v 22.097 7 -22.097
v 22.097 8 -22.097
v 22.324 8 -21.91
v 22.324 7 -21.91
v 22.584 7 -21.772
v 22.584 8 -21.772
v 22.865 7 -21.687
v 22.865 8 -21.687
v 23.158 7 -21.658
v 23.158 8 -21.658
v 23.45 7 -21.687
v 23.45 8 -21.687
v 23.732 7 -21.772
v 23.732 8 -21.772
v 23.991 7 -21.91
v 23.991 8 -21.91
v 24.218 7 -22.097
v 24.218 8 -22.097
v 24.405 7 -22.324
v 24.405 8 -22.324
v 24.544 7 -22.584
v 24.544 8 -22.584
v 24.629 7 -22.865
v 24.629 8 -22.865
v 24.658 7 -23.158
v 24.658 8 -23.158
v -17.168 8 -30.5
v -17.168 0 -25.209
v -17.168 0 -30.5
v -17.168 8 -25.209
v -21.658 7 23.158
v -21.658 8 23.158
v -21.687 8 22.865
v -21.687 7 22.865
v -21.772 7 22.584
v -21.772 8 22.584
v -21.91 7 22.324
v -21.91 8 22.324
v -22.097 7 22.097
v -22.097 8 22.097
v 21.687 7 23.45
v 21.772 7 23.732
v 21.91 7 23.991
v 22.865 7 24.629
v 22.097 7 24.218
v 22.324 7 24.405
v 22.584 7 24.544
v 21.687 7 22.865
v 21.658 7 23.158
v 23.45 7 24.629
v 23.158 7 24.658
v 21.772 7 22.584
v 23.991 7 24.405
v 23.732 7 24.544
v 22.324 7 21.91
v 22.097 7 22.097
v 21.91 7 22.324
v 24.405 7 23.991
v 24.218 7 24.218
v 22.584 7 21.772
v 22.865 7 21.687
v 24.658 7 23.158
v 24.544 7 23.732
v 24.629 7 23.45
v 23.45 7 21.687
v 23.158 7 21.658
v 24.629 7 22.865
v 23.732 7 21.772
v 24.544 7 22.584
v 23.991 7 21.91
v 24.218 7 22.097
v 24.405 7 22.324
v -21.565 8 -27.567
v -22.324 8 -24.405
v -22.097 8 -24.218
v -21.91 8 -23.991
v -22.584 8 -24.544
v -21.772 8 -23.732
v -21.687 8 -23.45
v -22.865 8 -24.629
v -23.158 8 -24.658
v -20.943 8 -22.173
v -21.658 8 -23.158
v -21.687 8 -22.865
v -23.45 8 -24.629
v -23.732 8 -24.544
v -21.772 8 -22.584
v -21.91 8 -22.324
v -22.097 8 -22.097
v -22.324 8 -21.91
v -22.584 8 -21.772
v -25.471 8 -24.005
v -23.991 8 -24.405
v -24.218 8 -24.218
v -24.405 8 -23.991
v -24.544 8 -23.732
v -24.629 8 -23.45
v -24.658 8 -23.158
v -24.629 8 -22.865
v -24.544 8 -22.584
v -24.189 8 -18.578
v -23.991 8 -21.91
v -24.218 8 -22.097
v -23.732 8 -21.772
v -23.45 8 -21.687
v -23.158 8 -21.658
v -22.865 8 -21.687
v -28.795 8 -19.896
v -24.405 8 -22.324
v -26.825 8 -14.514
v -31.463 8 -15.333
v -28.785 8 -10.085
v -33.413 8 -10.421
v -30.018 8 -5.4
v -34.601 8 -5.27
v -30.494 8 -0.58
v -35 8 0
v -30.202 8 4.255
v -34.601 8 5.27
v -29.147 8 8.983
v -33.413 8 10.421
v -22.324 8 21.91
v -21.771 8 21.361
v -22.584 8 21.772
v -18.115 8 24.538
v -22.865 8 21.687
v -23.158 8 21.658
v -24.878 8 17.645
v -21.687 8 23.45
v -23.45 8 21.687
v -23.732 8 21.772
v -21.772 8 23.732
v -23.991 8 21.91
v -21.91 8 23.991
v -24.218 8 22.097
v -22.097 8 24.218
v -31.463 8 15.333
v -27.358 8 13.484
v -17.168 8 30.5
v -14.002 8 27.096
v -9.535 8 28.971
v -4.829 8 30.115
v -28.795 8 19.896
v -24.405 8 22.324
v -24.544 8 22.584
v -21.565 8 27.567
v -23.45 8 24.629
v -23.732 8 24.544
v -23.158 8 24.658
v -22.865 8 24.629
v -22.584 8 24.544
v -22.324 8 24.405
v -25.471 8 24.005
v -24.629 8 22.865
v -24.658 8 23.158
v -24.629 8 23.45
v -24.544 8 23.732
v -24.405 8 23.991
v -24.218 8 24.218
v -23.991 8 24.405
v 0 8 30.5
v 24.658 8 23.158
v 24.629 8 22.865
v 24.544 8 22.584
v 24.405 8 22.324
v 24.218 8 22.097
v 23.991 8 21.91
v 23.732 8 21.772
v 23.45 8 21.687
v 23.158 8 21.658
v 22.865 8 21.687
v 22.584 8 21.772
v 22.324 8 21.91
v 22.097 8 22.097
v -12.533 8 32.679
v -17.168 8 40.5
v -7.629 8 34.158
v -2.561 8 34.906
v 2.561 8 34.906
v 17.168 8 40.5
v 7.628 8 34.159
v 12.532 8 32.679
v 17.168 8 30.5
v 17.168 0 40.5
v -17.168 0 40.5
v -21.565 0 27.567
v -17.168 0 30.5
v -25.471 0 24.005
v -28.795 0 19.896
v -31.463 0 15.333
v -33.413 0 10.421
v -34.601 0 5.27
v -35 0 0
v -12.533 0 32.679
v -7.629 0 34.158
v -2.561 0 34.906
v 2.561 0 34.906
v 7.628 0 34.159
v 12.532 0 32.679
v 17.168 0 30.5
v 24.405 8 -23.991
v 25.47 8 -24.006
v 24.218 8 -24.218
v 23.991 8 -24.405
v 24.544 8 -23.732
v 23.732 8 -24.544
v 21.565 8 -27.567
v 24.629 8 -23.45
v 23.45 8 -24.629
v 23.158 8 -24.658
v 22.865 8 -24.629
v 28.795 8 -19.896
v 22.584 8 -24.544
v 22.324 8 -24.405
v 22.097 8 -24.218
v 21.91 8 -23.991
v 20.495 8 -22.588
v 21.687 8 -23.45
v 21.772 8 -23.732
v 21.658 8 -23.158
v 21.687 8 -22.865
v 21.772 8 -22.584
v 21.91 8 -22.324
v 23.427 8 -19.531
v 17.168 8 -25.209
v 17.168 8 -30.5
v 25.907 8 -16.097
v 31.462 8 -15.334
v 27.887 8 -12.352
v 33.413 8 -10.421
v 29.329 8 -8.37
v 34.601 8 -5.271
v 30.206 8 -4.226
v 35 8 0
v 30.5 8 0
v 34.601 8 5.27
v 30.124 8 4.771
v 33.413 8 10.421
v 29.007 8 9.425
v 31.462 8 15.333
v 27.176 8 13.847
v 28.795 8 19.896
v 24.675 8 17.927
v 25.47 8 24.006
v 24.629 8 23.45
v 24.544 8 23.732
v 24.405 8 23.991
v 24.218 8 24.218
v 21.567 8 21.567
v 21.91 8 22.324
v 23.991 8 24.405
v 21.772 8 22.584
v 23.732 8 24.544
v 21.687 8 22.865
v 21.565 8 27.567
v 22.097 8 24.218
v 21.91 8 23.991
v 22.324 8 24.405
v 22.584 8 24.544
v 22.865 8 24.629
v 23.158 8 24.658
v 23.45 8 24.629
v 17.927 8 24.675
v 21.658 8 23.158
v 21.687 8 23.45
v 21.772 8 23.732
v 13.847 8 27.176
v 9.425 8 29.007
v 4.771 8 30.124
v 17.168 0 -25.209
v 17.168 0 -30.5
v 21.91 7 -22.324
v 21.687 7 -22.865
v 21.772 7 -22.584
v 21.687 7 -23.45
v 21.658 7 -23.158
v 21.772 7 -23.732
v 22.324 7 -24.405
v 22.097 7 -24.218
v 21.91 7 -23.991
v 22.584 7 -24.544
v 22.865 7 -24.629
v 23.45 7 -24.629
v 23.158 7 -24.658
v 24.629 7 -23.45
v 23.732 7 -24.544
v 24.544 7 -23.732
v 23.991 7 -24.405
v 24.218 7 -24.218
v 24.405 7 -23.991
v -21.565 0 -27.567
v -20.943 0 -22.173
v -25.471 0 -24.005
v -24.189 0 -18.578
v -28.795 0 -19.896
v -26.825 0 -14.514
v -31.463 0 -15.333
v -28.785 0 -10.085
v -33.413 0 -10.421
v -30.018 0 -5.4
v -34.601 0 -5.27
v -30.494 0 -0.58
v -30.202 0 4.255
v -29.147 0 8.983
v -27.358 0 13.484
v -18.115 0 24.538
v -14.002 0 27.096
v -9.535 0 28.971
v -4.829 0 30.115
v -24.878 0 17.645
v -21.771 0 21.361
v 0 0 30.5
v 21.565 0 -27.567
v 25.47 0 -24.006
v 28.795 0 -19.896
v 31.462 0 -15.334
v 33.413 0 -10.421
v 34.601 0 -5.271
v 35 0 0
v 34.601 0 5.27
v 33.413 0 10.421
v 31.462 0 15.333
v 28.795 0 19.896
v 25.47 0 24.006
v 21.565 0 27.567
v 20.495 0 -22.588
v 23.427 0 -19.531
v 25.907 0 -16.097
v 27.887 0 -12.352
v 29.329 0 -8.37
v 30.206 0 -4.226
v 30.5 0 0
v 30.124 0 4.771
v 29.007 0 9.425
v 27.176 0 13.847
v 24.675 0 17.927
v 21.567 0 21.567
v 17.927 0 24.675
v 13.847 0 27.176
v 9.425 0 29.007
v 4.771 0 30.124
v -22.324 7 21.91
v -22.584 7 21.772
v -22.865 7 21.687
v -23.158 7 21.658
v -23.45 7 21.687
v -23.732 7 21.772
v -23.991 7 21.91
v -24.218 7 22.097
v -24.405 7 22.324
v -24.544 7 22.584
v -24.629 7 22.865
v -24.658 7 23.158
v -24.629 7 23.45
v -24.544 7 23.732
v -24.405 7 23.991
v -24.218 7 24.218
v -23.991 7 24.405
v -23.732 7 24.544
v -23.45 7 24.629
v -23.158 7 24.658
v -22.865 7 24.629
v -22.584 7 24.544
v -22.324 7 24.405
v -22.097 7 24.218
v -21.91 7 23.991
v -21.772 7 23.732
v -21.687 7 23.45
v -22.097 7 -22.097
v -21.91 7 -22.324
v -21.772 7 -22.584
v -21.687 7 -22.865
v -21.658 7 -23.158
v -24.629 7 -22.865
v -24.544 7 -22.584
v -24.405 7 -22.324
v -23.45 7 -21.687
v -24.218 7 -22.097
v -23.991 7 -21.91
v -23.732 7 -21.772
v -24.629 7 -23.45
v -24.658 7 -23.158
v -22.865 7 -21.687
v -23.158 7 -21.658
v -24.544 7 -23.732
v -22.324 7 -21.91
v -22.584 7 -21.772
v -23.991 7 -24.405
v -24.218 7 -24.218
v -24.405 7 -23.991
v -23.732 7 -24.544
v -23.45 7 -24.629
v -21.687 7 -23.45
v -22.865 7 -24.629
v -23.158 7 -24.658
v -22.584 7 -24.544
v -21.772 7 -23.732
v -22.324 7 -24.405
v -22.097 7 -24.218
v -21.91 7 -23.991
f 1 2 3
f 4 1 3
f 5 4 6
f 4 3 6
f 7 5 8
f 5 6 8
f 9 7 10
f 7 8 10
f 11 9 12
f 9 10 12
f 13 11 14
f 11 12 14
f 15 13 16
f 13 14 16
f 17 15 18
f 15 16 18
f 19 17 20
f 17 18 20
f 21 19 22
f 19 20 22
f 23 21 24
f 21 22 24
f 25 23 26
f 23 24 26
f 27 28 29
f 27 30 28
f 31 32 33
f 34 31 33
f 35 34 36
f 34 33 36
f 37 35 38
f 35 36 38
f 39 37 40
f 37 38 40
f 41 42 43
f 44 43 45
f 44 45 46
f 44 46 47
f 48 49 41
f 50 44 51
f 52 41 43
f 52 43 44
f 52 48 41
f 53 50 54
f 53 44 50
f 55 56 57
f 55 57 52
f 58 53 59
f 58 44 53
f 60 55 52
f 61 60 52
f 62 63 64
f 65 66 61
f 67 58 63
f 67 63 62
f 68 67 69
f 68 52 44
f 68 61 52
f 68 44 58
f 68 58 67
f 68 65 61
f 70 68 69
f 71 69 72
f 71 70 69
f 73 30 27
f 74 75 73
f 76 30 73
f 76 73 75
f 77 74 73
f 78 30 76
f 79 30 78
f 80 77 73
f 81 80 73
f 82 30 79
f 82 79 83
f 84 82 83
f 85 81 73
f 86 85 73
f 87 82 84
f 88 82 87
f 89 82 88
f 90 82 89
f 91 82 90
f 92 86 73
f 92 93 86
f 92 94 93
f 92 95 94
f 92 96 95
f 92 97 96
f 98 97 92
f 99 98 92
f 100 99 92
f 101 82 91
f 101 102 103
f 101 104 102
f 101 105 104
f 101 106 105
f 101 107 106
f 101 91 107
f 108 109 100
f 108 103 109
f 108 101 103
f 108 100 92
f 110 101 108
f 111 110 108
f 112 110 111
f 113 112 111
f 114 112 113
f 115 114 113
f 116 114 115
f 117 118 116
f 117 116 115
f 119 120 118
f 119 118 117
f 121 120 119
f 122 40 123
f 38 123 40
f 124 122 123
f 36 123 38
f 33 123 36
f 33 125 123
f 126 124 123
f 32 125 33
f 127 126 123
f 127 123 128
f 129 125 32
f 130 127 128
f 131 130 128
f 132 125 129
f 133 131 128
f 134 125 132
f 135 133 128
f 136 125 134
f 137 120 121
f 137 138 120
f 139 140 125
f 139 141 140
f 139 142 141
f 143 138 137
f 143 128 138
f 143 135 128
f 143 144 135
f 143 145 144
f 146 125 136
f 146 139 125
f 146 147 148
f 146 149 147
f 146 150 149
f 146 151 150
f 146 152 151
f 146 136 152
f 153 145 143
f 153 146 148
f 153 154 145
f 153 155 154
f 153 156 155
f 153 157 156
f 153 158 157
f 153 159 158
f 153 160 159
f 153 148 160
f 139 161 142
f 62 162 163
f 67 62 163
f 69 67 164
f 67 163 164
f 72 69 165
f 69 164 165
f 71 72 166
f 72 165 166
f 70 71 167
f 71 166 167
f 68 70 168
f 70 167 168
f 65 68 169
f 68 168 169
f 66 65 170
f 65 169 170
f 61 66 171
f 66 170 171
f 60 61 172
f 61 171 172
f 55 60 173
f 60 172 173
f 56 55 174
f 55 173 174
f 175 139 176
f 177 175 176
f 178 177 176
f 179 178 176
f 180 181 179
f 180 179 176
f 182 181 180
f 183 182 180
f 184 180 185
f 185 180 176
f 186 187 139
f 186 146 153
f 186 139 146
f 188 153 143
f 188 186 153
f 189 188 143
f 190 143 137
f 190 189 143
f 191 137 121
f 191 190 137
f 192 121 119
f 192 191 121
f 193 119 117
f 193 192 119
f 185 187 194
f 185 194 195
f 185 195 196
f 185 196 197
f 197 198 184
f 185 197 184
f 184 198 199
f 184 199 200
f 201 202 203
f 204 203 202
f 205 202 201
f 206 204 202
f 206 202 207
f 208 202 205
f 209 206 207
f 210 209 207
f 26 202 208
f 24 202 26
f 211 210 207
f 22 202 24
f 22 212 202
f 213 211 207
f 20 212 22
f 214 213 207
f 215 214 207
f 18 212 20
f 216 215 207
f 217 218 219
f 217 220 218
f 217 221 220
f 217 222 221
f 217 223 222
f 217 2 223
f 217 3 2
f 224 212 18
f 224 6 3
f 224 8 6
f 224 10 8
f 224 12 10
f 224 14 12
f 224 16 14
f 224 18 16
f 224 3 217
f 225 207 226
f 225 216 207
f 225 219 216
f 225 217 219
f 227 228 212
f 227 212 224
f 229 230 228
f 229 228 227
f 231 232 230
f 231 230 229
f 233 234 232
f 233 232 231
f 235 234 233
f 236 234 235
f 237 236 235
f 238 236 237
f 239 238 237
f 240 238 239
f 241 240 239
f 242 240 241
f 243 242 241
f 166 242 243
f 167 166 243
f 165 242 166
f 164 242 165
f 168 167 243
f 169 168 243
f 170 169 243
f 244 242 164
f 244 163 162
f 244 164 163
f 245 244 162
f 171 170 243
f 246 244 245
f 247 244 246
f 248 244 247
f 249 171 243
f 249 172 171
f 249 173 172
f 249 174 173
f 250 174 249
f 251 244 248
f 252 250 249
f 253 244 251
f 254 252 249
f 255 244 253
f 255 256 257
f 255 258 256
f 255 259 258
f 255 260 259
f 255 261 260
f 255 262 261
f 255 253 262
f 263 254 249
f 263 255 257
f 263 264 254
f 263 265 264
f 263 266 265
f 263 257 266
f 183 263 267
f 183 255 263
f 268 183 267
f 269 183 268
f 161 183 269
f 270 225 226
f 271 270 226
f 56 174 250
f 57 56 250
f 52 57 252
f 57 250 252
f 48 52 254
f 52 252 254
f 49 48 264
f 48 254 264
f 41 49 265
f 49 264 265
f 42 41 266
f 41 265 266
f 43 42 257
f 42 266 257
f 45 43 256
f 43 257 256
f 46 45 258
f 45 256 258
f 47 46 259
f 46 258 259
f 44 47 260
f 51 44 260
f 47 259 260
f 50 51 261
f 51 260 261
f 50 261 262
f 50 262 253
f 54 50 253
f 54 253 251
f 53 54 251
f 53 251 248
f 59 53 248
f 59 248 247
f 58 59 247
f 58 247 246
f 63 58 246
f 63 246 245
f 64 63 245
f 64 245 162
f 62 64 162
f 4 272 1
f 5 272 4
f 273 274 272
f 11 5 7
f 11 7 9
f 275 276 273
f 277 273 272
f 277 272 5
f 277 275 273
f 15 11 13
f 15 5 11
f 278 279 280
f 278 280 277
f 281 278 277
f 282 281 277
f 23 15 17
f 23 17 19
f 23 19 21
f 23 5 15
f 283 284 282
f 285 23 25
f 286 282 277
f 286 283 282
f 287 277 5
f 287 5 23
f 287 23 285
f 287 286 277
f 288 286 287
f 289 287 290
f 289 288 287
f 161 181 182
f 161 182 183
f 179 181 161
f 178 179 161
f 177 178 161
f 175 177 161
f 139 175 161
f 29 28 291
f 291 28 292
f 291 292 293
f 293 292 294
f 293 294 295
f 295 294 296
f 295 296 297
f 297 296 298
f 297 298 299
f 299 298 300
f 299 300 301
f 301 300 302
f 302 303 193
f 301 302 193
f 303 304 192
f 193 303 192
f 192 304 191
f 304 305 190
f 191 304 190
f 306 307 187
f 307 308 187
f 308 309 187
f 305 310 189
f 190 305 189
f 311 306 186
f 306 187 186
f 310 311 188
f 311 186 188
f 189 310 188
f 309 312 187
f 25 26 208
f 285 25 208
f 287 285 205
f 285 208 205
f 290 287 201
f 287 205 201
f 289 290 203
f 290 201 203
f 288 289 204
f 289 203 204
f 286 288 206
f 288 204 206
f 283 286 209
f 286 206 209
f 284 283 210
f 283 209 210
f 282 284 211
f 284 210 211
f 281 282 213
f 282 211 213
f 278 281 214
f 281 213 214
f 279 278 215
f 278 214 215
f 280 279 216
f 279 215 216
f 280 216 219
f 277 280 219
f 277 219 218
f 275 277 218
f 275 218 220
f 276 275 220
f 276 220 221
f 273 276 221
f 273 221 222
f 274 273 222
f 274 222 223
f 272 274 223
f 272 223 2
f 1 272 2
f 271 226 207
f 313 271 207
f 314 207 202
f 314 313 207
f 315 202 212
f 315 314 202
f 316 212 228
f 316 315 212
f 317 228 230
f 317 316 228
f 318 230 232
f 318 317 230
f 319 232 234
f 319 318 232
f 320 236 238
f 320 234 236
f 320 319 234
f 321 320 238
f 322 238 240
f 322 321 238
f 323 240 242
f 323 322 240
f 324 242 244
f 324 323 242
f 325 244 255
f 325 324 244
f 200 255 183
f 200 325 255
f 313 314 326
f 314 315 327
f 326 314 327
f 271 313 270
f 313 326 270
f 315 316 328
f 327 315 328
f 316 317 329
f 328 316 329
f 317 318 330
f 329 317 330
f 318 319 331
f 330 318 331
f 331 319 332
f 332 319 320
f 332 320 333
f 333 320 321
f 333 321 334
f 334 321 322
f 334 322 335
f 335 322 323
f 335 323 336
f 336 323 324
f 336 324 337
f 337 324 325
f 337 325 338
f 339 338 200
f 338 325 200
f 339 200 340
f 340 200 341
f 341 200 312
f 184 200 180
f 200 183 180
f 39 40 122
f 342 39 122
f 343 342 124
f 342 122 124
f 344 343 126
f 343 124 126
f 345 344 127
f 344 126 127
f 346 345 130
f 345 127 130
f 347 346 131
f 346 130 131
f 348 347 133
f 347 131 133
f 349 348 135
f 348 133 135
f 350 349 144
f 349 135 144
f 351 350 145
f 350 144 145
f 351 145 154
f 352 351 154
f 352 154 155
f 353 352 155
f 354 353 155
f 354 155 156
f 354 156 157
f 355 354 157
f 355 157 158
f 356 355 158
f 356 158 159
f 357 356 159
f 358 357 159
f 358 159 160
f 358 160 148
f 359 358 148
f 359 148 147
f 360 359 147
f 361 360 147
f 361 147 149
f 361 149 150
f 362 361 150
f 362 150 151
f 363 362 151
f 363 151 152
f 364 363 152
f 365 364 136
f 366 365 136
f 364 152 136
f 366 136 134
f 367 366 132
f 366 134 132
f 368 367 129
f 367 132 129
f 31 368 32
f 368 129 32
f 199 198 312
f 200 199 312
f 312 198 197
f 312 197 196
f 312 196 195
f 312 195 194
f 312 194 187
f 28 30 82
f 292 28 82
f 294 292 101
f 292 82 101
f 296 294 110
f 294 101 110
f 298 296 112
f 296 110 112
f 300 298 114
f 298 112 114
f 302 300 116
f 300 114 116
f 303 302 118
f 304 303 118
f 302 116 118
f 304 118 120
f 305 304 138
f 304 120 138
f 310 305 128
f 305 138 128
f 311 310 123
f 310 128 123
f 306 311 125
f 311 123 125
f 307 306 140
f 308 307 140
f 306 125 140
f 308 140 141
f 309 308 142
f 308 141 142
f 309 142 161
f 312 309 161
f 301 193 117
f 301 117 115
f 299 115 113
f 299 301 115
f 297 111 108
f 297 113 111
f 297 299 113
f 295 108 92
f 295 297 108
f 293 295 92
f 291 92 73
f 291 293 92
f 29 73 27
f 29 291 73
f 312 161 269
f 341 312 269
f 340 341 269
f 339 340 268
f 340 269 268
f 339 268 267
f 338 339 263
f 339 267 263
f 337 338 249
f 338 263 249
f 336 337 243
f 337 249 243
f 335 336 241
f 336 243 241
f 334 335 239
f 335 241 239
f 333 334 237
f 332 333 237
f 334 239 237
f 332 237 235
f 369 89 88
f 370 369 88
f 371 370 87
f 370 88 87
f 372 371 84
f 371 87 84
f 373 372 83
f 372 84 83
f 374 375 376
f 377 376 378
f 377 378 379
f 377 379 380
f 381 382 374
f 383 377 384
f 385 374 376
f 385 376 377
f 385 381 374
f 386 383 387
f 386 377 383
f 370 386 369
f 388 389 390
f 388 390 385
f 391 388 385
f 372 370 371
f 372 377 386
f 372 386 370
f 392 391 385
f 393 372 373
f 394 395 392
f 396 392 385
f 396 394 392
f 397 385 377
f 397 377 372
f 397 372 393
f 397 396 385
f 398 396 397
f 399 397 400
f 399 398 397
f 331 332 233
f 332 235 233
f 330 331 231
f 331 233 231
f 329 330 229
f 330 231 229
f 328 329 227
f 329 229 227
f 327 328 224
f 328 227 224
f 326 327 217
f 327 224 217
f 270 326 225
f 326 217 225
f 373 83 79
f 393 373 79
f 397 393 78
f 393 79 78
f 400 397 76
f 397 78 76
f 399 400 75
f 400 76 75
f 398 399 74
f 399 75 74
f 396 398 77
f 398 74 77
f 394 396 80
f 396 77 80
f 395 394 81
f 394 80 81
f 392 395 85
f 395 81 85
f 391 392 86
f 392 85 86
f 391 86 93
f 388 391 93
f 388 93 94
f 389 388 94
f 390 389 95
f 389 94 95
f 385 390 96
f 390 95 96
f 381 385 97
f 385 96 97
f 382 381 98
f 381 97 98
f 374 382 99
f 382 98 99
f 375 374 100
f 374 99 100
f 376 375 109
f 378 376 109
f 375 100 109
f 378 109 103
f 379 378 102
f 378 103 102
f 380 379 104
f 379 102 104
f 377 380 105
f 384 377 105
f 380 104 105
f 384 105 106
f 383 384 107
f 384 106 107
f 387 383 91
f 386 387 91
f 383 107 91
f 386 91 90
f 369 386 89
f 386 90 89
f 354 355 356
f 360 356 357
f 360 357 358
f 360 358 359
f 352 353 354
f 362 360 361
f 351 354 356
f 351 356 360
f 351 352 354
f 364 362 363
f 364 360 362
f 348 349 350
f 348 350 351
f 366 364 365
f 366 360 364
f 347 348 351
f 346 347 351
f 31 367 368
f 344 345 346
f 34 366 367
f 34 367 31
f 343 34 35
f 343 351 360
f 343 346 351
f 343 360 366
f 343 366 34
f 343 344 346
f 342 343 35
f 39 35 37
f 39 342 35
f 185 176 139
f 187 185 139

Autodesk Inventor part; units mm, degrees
ref_plane "YZ Plane" through (0, 0, 0) normal (1, 0, 0) x (0, 1, 0)
ref_plane "XZ Plane" through (0, 0, 0) normal (0, 1, 0) x (-1, 0, 0)
ref_plane "XY Plane" through (0, 0, 0) normal (0, 0, 1) x (1, 0, 0)
sketch "Sketch1" plane through (0, 0, 0) normal (0, 1, 0) x (-1, 0, 0)
  circle A0 centre (0, 0) radius 35
  dimension "d0" = 70
extrude "Extrusion1" add sketch "Sketch1" along normal blind 8
sketch "Sketch2" plane through (0, 8, 0) normal (0, 1, 0) x (1, 0, 0)
  circle A0 centre (0, 0) radius 30.5
  dimension "d3" = 61
extrude "Extrusion2" cut sketch "Sketch2" against normal blind 8
sketch "Sketch3" plane through (0, 8, 0) normal (0, 1, 0) x (1, 0, 0)
  circle A0 centre (0, 0) radius 30.5 projected
  line L0 (0, -30.5) -> (-17.1683, -30.5)
  circle A1 centre (0, 0) radius 35 projected
  line L1 (-17.1683, -30.5) -> (17.1677, -30.5)
  line L2 (17.1677, -30.5) -> (17.1677, -40.5)
  line L3 (17.1677, -40.5) -> (-17.1683, -40.5)
  line L4 (-17.1683, -40.5) -> (-17.1683, -30.5)
  dimension "d6" = 34.336
  dimension "d7" = 10
extrude "Extrusion3" add sketch "Sketch3" against normal blind 8 contours L1 A1 L0 | A1 L2 L3 L4 picked at (9.255, -31.4525)
sketch "Sketch4" plane through (0, 8, 0) normal (0, 1, 0) x (1, 0, 0)
  line L0 (-17.1683, -40.5) -> (-17.1683, -30.5) projected
  line L1 (-17.1683, -30.5) -> (-17.1683, 30.5)
  arc A0 (17.1677, -30.5003) -> (-17.1683, -30.5) centre (0, 0) ccw projected
  line L2 (17.1677, -30.5003) -> (17.1677, 30.5)
  circle A1 centre (0, 0) radius 30.5 projected
  line L3 (-17.1683, 25.2091) -> (17.1677, 25.2091)
  line L4 (17.1677, 25.2091) -> (17.1677, 37.2402)
  line L5 (17.1677, 37.2402) -> (-17.1683, 37.2402)
  line L6 (-17.1683, 37.2402) -> (-17.1683, 25.2091)
  point P0 (17.1677, 30.5)
extrude "Extrusion4" cut sketch "Sketch4" against normal blind 8 contours L1 A0 L2 A1 | A1 L3 | L6 L5 L4 A0
sketch "Sketch5" plane through (0, 8, 0) normal (0, 1, 0) x (1, 0, 0)
  point P0 (0, 0)
sketch "Sketch6" plane through (0, 8, 0) normal (0, 1, 0) x (1, 0, 0)
  line L0 (0, 0) -> (-23.1577, 23.1577)
  line L1 (0, 0) -> (32.75, 0) construction
  circle A0 centre (-23.1577, 23.1577) radius 1.5
  dimension "d12" = 32.75
  dimension "d13" = 135
  dimension "d14" = 3
extrude "Extrusion5" cut sketch "Sketch6" against normal blind 1
sketch "Sketch7" plane through (0, 8, 0) normal (0, 1, 0) x (1, 0, 0)
  line L0 (0, 0) -> (-23.1577, -23.1577)
  line L1 (0, 0) -> (32.75, 0) construction
  circle A0 centre (-23.1577, -23.1577) radius 1.5
  dimension "d17" = 32.75
  dimension "d18" = 135
  dimension "d19" = 3
extrude "Extrusion6" cut sketch "Sketch7" against normal blind 1
sketch "Sketch8" plane through (0, 8, 0) normal (0, 1, 0) x (1, 0, 0)
  line L0 (0, 0) -> (23.1577, -23.1577)
  line L1 (0, 0) -> (32.75, 0) construction
  circle A0 centre (23.1577, -23.1577) radius 1.5
  dimension "d22" = 32.75
  dimension "d23" = 45
  dimension "d24" = 3
extrude "Extrusion7" cut sketch "Sketch8" against normal blind 1
sketch "Sketch9" plane through (0, 8, 0) normal (0, 1, 0) x (1, 0, 0)
  line L0 (0, 0) -> (23.1577, 23.1577)
  line L1 (0, 0) -> (32.75, 0) construction
  circle A0 centre (23.1577, 23.1577) radius 1.5
  dimension "d27" = 32.75
  dimension "d28" = 45
  dimension "d29" = 3
extrude "Extrusion8" cut sketch "Sketch9" against normal blind 1
sketch "Sketch10" plane through (0, 8, 0) normal (0, 1, 0) x (1, 0, 0)
  point P0 (0, 0)
properties part number "expo5"
